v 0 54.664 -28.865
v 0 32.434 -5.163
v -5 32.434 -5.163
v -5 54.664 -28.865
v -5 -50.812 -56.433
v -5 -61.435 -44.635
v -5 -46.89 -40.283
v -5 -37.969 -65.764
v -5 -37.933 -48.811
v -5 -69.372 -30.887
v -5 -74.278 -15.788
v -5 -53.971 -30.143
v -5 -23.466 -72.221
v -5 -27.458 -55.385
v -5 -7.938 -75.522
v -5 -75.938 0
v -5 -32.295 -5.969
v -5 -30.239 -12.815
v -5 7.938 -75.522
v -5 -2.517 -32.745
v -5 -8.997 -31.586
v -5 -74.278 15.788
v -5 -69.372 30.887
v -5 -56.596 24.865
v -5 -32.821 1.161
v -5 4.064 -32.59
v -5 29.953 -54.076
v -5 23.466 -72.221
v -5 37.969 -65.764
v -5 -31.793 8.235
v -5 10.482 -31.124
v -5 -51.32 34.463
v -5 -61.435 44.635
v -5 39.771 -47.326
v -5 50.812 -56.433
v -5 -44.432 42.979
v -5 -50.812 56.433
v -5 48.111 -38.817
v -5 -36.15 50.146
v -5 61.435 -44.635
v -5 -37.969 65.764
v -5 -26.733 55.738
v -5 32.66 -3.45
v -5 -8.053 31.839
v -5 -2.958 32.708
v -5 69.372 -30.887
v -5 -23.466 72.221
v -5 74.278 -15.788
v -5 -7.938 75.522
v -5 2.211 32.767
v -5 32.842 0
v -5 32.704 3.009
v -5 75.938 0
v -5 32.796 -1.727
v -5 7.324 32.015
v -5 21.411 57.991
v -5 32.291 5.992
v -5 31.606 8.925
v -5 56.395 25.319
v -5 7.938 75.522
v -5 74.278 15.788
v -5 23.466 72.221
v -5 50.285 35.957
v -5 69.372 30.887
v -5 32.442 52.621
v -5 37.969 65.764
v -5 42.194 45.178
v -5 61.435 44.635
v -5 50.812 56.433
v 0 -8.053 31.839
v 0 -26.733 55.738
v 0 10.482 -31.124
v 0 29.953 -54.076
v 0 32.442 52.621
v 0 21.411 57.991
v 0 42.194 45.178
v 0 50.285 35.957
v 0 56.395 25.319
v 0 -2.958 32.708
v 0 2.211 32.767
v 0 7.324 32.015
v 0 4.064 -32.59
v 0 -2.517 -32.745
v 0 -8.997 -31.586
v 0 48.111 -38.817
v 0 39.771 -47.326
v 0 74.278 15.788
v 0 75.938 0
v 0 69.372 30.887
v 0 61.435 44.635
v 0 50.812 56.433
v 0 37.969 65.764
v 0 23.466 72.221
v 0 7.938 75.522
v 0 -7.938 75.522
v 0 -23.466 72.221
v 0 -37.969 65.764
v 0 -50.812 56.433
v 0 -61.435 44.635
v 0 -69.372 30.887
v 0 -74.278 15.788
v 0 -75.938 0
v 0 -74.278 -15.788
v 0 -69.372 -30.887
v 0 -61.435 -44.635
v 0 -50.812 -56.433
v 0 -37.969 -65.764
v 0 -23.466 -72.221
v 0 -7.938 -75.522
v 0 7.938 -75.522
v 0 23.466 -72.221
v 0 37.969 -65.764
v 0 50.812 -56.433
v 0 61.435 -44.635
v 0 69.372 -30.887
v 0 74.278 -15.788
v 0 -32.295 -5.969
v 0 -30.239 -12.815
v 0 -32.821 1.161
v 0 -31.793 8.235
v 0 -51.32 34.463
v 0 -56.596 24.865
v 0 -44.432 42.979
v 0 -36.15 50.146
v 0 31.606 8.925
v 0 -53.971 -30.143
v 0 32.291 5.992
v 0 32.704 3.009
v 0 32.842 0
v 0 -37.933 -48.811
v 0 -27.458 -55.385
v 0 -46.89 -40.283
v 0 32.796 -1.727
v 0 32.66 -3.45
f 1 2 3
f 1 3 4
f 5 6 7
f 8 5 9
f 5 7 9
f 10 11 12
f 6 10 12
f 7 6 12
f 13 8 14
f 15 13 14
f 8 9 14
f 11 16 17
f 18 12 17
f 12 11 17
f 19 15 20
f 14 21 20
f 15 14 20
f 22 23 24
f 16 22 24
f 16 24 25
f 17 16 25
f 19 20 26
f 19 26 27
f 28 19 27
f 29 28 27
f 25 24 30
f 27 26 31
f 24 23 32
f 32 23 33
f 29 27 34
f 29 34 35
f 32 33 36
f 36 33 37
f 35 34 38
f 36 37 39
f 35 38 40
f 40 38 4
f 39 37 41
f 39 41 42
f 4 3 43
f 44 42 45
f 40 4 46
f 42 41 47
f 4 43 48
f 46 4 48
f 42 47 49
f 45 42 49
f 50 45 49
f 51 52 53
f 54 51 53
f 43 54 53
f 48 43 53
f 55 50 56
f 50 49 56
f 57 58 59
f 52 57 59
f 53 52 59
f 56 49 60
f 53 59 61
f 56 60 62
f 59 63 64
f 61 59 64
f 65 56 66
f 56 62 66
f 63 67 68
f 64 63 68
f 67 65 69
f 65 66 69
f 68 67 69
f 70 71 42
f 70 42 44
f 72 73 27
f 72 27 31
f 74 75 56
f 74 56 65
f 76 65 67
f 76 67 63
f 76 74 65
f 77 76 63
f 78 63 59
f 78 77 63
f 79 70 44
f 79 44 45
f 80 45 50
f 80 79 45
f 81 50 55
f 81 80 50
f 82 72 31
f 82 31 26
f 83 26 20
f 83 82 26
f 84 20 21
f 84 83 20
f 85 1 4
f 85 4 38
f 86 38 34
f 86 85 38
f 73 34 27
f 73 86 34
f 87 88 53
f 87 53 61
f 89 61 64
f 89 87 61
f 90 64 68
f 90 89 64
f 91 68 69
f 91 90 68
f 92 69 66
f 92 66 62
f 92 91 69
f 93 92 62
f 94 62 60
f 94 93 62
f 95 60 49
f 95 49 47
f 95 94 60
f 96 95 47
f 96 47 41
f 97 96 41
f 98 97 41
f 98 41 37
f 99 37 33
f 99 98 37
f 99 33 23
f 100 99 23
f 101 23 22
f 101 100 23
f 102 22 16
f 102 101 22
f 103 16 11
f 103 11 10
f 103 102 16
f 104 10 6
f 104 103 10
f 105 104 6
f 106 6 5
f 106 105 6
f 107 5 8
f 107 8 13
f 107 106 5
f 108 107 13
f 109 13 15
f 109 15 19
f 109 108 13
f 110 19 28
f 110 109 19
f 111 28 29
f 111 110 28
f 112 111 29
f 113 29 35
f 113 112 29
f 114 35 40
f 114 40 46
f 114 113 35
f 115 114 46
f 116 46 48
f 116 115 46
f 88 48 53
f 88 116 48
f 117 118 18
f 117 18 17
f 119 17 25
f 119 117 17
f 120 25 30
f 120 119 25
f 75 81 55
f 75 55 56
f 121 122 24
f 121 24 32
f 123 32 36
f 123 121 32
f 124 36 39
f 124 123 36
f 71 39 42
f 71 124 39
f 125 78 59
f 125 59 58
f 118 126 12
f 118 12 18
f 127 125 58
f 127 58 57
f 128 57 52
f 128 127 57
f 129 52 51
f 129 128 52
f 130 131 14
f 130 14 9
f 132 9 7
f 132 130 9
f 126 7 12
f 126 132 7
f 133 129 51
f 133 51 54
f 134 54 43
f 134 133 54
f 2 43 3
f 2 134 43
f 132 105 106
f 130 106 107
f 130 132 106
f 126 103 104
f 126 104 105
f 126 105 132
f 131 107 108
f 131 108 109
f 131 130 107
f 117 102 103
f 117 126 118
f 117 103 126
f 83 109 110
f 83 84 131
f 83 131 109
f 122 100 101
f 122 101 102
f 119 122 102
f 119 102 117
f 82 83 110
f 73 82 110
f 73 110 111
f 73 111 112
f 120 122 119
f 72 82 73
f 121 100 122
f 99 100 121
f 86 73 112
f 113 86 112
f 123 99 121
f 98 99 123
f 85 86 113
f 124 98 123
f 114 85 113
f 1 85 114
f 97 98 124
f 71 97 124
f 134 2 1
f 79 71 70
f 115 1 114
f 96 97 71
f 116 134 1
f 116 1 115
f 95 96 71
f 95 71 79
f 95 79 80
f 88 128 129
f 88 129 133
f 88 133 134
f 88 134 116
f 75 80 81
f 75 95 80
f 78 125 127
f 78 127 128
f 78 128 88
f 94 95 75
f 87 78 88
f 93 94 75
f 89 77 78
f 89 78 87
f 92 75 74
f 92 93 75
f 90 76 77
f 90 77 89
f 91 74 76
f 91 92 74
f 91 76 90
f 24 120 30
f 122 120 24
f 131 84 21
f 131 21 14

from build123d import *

# Parameters (mm, degrees)
F0_R     = 75.9376
F0_R_2   = 68.52161
F1_DEPTH = 5


with BuildPart() as f1:
    # F0 (on Right) → F1 (new body)
    with BuildSketch(Plane.YZ):
        Circle(F0_R)
        Circle(F0_R_2, mode=Mode.SUBTRACT)
        Circle(F0_R_2)
        with BuildLine():
            ThreePointArc((56.394858, 25.318694), (60.446718, 12.946452), (61.817605, 0))
            ThreePointArc((61.817605, 0), (60.002667, -14.869305), (54.664425, -28.865497))
            ThreePointArc((54.664425, -28.865497), (44.14642, -43.272507), (29.952561, -54.076431))
            ThreePointArc((29.952561, -54.076431), (1.408359, -61.80156), (-27.458115, -55.384729))
            ThreePointArc((-27.458115, -55.384729), (-42.625694, -44.771269), (-53.970641, -30.142764))
            ThreePointArc((-53.970641, -30.142764), (-61.747297, -2.947473), (-56.596401, 24.864908))
            ThreePointArc((-56.596401, 24.864908), (-44.432395, 42.978815), (-26.732948, 55.738369))
            ThreePointArc((-26.732948, 55.738369), (-2.889331, 61.750045), (21.411461, 57.991082))
            ThreePointArc((21.411461, 57.991082), (42.193922, 45.178416), (56.394858, 25.318694))
        make_face(mode=Mode.SUBTRACT)
        with BuildLine():
            Line((-31.792757, 8.234946), (-56.596401, 24.864908))
            ThreePointArc((-56.596401, 24.864908), (-61.747297, -2.947473), (-53.970641, -30.142764))
            Line((-53.970641, -30.142764), (-30.23852, -12.815055))
            ThreePointArc((-30.23852, -12.815055), (-32.752793, -2.418318), (-31.792757, 8.234946))
        make_face()
        with BuildLine():
            Line((7.324043, 32.014874), (21.411461, 57.991082))
            ThreePointArc((21.411461, 57.991082), (-2.889331, 61.750045), (-26.732948, 55.738369))
            Line((-26.732948, 55.738369), (-8.052702, 31.839405))
            ThreePointArc((-8.052702, 31.839405), (-0.374745, 32.839813), (7.324043, 32.014874))
        make_face()
        with BuildLine():
            ThreePointArc((-27.458115, -55.384729), (1.408359, -61.80156), (29.952561, -54.076431))
            Line((29.952561, -54.076431), (10.481953, -31.124306))
            ThreePointArc((10.481953, -31.124306), (0.777417, -32.832748), (-8.997103, -31.585533))
            Line((-8.997103, -31.585533), (-27.458115, -55.384729))
        make_face()
        with BuildLine():
            ThreePointArc((54.664425, -28.865497), (60.002667, -14.869305), (61.817605, 0))
            ThreePointArc((61.817605, 0), (60.446718, 12.946452), (56.394858, 25.318694))
            Line((56.394858, 25.318694), (31.605966, 8.925057))
            ThreePointArc((31.605966, 8.925057), (32.531487, 4.505117), (32.841951, 0))
            ThreePointArc((32.841951, 0), (32.739709, -2.589439), (32.43362, -5.162756))
            Line((32.43362, -5.162756), (54.664425, -28.865497))
        make_face()
    extrude(amount=-F1_DEPTH)


solid = f1.part
